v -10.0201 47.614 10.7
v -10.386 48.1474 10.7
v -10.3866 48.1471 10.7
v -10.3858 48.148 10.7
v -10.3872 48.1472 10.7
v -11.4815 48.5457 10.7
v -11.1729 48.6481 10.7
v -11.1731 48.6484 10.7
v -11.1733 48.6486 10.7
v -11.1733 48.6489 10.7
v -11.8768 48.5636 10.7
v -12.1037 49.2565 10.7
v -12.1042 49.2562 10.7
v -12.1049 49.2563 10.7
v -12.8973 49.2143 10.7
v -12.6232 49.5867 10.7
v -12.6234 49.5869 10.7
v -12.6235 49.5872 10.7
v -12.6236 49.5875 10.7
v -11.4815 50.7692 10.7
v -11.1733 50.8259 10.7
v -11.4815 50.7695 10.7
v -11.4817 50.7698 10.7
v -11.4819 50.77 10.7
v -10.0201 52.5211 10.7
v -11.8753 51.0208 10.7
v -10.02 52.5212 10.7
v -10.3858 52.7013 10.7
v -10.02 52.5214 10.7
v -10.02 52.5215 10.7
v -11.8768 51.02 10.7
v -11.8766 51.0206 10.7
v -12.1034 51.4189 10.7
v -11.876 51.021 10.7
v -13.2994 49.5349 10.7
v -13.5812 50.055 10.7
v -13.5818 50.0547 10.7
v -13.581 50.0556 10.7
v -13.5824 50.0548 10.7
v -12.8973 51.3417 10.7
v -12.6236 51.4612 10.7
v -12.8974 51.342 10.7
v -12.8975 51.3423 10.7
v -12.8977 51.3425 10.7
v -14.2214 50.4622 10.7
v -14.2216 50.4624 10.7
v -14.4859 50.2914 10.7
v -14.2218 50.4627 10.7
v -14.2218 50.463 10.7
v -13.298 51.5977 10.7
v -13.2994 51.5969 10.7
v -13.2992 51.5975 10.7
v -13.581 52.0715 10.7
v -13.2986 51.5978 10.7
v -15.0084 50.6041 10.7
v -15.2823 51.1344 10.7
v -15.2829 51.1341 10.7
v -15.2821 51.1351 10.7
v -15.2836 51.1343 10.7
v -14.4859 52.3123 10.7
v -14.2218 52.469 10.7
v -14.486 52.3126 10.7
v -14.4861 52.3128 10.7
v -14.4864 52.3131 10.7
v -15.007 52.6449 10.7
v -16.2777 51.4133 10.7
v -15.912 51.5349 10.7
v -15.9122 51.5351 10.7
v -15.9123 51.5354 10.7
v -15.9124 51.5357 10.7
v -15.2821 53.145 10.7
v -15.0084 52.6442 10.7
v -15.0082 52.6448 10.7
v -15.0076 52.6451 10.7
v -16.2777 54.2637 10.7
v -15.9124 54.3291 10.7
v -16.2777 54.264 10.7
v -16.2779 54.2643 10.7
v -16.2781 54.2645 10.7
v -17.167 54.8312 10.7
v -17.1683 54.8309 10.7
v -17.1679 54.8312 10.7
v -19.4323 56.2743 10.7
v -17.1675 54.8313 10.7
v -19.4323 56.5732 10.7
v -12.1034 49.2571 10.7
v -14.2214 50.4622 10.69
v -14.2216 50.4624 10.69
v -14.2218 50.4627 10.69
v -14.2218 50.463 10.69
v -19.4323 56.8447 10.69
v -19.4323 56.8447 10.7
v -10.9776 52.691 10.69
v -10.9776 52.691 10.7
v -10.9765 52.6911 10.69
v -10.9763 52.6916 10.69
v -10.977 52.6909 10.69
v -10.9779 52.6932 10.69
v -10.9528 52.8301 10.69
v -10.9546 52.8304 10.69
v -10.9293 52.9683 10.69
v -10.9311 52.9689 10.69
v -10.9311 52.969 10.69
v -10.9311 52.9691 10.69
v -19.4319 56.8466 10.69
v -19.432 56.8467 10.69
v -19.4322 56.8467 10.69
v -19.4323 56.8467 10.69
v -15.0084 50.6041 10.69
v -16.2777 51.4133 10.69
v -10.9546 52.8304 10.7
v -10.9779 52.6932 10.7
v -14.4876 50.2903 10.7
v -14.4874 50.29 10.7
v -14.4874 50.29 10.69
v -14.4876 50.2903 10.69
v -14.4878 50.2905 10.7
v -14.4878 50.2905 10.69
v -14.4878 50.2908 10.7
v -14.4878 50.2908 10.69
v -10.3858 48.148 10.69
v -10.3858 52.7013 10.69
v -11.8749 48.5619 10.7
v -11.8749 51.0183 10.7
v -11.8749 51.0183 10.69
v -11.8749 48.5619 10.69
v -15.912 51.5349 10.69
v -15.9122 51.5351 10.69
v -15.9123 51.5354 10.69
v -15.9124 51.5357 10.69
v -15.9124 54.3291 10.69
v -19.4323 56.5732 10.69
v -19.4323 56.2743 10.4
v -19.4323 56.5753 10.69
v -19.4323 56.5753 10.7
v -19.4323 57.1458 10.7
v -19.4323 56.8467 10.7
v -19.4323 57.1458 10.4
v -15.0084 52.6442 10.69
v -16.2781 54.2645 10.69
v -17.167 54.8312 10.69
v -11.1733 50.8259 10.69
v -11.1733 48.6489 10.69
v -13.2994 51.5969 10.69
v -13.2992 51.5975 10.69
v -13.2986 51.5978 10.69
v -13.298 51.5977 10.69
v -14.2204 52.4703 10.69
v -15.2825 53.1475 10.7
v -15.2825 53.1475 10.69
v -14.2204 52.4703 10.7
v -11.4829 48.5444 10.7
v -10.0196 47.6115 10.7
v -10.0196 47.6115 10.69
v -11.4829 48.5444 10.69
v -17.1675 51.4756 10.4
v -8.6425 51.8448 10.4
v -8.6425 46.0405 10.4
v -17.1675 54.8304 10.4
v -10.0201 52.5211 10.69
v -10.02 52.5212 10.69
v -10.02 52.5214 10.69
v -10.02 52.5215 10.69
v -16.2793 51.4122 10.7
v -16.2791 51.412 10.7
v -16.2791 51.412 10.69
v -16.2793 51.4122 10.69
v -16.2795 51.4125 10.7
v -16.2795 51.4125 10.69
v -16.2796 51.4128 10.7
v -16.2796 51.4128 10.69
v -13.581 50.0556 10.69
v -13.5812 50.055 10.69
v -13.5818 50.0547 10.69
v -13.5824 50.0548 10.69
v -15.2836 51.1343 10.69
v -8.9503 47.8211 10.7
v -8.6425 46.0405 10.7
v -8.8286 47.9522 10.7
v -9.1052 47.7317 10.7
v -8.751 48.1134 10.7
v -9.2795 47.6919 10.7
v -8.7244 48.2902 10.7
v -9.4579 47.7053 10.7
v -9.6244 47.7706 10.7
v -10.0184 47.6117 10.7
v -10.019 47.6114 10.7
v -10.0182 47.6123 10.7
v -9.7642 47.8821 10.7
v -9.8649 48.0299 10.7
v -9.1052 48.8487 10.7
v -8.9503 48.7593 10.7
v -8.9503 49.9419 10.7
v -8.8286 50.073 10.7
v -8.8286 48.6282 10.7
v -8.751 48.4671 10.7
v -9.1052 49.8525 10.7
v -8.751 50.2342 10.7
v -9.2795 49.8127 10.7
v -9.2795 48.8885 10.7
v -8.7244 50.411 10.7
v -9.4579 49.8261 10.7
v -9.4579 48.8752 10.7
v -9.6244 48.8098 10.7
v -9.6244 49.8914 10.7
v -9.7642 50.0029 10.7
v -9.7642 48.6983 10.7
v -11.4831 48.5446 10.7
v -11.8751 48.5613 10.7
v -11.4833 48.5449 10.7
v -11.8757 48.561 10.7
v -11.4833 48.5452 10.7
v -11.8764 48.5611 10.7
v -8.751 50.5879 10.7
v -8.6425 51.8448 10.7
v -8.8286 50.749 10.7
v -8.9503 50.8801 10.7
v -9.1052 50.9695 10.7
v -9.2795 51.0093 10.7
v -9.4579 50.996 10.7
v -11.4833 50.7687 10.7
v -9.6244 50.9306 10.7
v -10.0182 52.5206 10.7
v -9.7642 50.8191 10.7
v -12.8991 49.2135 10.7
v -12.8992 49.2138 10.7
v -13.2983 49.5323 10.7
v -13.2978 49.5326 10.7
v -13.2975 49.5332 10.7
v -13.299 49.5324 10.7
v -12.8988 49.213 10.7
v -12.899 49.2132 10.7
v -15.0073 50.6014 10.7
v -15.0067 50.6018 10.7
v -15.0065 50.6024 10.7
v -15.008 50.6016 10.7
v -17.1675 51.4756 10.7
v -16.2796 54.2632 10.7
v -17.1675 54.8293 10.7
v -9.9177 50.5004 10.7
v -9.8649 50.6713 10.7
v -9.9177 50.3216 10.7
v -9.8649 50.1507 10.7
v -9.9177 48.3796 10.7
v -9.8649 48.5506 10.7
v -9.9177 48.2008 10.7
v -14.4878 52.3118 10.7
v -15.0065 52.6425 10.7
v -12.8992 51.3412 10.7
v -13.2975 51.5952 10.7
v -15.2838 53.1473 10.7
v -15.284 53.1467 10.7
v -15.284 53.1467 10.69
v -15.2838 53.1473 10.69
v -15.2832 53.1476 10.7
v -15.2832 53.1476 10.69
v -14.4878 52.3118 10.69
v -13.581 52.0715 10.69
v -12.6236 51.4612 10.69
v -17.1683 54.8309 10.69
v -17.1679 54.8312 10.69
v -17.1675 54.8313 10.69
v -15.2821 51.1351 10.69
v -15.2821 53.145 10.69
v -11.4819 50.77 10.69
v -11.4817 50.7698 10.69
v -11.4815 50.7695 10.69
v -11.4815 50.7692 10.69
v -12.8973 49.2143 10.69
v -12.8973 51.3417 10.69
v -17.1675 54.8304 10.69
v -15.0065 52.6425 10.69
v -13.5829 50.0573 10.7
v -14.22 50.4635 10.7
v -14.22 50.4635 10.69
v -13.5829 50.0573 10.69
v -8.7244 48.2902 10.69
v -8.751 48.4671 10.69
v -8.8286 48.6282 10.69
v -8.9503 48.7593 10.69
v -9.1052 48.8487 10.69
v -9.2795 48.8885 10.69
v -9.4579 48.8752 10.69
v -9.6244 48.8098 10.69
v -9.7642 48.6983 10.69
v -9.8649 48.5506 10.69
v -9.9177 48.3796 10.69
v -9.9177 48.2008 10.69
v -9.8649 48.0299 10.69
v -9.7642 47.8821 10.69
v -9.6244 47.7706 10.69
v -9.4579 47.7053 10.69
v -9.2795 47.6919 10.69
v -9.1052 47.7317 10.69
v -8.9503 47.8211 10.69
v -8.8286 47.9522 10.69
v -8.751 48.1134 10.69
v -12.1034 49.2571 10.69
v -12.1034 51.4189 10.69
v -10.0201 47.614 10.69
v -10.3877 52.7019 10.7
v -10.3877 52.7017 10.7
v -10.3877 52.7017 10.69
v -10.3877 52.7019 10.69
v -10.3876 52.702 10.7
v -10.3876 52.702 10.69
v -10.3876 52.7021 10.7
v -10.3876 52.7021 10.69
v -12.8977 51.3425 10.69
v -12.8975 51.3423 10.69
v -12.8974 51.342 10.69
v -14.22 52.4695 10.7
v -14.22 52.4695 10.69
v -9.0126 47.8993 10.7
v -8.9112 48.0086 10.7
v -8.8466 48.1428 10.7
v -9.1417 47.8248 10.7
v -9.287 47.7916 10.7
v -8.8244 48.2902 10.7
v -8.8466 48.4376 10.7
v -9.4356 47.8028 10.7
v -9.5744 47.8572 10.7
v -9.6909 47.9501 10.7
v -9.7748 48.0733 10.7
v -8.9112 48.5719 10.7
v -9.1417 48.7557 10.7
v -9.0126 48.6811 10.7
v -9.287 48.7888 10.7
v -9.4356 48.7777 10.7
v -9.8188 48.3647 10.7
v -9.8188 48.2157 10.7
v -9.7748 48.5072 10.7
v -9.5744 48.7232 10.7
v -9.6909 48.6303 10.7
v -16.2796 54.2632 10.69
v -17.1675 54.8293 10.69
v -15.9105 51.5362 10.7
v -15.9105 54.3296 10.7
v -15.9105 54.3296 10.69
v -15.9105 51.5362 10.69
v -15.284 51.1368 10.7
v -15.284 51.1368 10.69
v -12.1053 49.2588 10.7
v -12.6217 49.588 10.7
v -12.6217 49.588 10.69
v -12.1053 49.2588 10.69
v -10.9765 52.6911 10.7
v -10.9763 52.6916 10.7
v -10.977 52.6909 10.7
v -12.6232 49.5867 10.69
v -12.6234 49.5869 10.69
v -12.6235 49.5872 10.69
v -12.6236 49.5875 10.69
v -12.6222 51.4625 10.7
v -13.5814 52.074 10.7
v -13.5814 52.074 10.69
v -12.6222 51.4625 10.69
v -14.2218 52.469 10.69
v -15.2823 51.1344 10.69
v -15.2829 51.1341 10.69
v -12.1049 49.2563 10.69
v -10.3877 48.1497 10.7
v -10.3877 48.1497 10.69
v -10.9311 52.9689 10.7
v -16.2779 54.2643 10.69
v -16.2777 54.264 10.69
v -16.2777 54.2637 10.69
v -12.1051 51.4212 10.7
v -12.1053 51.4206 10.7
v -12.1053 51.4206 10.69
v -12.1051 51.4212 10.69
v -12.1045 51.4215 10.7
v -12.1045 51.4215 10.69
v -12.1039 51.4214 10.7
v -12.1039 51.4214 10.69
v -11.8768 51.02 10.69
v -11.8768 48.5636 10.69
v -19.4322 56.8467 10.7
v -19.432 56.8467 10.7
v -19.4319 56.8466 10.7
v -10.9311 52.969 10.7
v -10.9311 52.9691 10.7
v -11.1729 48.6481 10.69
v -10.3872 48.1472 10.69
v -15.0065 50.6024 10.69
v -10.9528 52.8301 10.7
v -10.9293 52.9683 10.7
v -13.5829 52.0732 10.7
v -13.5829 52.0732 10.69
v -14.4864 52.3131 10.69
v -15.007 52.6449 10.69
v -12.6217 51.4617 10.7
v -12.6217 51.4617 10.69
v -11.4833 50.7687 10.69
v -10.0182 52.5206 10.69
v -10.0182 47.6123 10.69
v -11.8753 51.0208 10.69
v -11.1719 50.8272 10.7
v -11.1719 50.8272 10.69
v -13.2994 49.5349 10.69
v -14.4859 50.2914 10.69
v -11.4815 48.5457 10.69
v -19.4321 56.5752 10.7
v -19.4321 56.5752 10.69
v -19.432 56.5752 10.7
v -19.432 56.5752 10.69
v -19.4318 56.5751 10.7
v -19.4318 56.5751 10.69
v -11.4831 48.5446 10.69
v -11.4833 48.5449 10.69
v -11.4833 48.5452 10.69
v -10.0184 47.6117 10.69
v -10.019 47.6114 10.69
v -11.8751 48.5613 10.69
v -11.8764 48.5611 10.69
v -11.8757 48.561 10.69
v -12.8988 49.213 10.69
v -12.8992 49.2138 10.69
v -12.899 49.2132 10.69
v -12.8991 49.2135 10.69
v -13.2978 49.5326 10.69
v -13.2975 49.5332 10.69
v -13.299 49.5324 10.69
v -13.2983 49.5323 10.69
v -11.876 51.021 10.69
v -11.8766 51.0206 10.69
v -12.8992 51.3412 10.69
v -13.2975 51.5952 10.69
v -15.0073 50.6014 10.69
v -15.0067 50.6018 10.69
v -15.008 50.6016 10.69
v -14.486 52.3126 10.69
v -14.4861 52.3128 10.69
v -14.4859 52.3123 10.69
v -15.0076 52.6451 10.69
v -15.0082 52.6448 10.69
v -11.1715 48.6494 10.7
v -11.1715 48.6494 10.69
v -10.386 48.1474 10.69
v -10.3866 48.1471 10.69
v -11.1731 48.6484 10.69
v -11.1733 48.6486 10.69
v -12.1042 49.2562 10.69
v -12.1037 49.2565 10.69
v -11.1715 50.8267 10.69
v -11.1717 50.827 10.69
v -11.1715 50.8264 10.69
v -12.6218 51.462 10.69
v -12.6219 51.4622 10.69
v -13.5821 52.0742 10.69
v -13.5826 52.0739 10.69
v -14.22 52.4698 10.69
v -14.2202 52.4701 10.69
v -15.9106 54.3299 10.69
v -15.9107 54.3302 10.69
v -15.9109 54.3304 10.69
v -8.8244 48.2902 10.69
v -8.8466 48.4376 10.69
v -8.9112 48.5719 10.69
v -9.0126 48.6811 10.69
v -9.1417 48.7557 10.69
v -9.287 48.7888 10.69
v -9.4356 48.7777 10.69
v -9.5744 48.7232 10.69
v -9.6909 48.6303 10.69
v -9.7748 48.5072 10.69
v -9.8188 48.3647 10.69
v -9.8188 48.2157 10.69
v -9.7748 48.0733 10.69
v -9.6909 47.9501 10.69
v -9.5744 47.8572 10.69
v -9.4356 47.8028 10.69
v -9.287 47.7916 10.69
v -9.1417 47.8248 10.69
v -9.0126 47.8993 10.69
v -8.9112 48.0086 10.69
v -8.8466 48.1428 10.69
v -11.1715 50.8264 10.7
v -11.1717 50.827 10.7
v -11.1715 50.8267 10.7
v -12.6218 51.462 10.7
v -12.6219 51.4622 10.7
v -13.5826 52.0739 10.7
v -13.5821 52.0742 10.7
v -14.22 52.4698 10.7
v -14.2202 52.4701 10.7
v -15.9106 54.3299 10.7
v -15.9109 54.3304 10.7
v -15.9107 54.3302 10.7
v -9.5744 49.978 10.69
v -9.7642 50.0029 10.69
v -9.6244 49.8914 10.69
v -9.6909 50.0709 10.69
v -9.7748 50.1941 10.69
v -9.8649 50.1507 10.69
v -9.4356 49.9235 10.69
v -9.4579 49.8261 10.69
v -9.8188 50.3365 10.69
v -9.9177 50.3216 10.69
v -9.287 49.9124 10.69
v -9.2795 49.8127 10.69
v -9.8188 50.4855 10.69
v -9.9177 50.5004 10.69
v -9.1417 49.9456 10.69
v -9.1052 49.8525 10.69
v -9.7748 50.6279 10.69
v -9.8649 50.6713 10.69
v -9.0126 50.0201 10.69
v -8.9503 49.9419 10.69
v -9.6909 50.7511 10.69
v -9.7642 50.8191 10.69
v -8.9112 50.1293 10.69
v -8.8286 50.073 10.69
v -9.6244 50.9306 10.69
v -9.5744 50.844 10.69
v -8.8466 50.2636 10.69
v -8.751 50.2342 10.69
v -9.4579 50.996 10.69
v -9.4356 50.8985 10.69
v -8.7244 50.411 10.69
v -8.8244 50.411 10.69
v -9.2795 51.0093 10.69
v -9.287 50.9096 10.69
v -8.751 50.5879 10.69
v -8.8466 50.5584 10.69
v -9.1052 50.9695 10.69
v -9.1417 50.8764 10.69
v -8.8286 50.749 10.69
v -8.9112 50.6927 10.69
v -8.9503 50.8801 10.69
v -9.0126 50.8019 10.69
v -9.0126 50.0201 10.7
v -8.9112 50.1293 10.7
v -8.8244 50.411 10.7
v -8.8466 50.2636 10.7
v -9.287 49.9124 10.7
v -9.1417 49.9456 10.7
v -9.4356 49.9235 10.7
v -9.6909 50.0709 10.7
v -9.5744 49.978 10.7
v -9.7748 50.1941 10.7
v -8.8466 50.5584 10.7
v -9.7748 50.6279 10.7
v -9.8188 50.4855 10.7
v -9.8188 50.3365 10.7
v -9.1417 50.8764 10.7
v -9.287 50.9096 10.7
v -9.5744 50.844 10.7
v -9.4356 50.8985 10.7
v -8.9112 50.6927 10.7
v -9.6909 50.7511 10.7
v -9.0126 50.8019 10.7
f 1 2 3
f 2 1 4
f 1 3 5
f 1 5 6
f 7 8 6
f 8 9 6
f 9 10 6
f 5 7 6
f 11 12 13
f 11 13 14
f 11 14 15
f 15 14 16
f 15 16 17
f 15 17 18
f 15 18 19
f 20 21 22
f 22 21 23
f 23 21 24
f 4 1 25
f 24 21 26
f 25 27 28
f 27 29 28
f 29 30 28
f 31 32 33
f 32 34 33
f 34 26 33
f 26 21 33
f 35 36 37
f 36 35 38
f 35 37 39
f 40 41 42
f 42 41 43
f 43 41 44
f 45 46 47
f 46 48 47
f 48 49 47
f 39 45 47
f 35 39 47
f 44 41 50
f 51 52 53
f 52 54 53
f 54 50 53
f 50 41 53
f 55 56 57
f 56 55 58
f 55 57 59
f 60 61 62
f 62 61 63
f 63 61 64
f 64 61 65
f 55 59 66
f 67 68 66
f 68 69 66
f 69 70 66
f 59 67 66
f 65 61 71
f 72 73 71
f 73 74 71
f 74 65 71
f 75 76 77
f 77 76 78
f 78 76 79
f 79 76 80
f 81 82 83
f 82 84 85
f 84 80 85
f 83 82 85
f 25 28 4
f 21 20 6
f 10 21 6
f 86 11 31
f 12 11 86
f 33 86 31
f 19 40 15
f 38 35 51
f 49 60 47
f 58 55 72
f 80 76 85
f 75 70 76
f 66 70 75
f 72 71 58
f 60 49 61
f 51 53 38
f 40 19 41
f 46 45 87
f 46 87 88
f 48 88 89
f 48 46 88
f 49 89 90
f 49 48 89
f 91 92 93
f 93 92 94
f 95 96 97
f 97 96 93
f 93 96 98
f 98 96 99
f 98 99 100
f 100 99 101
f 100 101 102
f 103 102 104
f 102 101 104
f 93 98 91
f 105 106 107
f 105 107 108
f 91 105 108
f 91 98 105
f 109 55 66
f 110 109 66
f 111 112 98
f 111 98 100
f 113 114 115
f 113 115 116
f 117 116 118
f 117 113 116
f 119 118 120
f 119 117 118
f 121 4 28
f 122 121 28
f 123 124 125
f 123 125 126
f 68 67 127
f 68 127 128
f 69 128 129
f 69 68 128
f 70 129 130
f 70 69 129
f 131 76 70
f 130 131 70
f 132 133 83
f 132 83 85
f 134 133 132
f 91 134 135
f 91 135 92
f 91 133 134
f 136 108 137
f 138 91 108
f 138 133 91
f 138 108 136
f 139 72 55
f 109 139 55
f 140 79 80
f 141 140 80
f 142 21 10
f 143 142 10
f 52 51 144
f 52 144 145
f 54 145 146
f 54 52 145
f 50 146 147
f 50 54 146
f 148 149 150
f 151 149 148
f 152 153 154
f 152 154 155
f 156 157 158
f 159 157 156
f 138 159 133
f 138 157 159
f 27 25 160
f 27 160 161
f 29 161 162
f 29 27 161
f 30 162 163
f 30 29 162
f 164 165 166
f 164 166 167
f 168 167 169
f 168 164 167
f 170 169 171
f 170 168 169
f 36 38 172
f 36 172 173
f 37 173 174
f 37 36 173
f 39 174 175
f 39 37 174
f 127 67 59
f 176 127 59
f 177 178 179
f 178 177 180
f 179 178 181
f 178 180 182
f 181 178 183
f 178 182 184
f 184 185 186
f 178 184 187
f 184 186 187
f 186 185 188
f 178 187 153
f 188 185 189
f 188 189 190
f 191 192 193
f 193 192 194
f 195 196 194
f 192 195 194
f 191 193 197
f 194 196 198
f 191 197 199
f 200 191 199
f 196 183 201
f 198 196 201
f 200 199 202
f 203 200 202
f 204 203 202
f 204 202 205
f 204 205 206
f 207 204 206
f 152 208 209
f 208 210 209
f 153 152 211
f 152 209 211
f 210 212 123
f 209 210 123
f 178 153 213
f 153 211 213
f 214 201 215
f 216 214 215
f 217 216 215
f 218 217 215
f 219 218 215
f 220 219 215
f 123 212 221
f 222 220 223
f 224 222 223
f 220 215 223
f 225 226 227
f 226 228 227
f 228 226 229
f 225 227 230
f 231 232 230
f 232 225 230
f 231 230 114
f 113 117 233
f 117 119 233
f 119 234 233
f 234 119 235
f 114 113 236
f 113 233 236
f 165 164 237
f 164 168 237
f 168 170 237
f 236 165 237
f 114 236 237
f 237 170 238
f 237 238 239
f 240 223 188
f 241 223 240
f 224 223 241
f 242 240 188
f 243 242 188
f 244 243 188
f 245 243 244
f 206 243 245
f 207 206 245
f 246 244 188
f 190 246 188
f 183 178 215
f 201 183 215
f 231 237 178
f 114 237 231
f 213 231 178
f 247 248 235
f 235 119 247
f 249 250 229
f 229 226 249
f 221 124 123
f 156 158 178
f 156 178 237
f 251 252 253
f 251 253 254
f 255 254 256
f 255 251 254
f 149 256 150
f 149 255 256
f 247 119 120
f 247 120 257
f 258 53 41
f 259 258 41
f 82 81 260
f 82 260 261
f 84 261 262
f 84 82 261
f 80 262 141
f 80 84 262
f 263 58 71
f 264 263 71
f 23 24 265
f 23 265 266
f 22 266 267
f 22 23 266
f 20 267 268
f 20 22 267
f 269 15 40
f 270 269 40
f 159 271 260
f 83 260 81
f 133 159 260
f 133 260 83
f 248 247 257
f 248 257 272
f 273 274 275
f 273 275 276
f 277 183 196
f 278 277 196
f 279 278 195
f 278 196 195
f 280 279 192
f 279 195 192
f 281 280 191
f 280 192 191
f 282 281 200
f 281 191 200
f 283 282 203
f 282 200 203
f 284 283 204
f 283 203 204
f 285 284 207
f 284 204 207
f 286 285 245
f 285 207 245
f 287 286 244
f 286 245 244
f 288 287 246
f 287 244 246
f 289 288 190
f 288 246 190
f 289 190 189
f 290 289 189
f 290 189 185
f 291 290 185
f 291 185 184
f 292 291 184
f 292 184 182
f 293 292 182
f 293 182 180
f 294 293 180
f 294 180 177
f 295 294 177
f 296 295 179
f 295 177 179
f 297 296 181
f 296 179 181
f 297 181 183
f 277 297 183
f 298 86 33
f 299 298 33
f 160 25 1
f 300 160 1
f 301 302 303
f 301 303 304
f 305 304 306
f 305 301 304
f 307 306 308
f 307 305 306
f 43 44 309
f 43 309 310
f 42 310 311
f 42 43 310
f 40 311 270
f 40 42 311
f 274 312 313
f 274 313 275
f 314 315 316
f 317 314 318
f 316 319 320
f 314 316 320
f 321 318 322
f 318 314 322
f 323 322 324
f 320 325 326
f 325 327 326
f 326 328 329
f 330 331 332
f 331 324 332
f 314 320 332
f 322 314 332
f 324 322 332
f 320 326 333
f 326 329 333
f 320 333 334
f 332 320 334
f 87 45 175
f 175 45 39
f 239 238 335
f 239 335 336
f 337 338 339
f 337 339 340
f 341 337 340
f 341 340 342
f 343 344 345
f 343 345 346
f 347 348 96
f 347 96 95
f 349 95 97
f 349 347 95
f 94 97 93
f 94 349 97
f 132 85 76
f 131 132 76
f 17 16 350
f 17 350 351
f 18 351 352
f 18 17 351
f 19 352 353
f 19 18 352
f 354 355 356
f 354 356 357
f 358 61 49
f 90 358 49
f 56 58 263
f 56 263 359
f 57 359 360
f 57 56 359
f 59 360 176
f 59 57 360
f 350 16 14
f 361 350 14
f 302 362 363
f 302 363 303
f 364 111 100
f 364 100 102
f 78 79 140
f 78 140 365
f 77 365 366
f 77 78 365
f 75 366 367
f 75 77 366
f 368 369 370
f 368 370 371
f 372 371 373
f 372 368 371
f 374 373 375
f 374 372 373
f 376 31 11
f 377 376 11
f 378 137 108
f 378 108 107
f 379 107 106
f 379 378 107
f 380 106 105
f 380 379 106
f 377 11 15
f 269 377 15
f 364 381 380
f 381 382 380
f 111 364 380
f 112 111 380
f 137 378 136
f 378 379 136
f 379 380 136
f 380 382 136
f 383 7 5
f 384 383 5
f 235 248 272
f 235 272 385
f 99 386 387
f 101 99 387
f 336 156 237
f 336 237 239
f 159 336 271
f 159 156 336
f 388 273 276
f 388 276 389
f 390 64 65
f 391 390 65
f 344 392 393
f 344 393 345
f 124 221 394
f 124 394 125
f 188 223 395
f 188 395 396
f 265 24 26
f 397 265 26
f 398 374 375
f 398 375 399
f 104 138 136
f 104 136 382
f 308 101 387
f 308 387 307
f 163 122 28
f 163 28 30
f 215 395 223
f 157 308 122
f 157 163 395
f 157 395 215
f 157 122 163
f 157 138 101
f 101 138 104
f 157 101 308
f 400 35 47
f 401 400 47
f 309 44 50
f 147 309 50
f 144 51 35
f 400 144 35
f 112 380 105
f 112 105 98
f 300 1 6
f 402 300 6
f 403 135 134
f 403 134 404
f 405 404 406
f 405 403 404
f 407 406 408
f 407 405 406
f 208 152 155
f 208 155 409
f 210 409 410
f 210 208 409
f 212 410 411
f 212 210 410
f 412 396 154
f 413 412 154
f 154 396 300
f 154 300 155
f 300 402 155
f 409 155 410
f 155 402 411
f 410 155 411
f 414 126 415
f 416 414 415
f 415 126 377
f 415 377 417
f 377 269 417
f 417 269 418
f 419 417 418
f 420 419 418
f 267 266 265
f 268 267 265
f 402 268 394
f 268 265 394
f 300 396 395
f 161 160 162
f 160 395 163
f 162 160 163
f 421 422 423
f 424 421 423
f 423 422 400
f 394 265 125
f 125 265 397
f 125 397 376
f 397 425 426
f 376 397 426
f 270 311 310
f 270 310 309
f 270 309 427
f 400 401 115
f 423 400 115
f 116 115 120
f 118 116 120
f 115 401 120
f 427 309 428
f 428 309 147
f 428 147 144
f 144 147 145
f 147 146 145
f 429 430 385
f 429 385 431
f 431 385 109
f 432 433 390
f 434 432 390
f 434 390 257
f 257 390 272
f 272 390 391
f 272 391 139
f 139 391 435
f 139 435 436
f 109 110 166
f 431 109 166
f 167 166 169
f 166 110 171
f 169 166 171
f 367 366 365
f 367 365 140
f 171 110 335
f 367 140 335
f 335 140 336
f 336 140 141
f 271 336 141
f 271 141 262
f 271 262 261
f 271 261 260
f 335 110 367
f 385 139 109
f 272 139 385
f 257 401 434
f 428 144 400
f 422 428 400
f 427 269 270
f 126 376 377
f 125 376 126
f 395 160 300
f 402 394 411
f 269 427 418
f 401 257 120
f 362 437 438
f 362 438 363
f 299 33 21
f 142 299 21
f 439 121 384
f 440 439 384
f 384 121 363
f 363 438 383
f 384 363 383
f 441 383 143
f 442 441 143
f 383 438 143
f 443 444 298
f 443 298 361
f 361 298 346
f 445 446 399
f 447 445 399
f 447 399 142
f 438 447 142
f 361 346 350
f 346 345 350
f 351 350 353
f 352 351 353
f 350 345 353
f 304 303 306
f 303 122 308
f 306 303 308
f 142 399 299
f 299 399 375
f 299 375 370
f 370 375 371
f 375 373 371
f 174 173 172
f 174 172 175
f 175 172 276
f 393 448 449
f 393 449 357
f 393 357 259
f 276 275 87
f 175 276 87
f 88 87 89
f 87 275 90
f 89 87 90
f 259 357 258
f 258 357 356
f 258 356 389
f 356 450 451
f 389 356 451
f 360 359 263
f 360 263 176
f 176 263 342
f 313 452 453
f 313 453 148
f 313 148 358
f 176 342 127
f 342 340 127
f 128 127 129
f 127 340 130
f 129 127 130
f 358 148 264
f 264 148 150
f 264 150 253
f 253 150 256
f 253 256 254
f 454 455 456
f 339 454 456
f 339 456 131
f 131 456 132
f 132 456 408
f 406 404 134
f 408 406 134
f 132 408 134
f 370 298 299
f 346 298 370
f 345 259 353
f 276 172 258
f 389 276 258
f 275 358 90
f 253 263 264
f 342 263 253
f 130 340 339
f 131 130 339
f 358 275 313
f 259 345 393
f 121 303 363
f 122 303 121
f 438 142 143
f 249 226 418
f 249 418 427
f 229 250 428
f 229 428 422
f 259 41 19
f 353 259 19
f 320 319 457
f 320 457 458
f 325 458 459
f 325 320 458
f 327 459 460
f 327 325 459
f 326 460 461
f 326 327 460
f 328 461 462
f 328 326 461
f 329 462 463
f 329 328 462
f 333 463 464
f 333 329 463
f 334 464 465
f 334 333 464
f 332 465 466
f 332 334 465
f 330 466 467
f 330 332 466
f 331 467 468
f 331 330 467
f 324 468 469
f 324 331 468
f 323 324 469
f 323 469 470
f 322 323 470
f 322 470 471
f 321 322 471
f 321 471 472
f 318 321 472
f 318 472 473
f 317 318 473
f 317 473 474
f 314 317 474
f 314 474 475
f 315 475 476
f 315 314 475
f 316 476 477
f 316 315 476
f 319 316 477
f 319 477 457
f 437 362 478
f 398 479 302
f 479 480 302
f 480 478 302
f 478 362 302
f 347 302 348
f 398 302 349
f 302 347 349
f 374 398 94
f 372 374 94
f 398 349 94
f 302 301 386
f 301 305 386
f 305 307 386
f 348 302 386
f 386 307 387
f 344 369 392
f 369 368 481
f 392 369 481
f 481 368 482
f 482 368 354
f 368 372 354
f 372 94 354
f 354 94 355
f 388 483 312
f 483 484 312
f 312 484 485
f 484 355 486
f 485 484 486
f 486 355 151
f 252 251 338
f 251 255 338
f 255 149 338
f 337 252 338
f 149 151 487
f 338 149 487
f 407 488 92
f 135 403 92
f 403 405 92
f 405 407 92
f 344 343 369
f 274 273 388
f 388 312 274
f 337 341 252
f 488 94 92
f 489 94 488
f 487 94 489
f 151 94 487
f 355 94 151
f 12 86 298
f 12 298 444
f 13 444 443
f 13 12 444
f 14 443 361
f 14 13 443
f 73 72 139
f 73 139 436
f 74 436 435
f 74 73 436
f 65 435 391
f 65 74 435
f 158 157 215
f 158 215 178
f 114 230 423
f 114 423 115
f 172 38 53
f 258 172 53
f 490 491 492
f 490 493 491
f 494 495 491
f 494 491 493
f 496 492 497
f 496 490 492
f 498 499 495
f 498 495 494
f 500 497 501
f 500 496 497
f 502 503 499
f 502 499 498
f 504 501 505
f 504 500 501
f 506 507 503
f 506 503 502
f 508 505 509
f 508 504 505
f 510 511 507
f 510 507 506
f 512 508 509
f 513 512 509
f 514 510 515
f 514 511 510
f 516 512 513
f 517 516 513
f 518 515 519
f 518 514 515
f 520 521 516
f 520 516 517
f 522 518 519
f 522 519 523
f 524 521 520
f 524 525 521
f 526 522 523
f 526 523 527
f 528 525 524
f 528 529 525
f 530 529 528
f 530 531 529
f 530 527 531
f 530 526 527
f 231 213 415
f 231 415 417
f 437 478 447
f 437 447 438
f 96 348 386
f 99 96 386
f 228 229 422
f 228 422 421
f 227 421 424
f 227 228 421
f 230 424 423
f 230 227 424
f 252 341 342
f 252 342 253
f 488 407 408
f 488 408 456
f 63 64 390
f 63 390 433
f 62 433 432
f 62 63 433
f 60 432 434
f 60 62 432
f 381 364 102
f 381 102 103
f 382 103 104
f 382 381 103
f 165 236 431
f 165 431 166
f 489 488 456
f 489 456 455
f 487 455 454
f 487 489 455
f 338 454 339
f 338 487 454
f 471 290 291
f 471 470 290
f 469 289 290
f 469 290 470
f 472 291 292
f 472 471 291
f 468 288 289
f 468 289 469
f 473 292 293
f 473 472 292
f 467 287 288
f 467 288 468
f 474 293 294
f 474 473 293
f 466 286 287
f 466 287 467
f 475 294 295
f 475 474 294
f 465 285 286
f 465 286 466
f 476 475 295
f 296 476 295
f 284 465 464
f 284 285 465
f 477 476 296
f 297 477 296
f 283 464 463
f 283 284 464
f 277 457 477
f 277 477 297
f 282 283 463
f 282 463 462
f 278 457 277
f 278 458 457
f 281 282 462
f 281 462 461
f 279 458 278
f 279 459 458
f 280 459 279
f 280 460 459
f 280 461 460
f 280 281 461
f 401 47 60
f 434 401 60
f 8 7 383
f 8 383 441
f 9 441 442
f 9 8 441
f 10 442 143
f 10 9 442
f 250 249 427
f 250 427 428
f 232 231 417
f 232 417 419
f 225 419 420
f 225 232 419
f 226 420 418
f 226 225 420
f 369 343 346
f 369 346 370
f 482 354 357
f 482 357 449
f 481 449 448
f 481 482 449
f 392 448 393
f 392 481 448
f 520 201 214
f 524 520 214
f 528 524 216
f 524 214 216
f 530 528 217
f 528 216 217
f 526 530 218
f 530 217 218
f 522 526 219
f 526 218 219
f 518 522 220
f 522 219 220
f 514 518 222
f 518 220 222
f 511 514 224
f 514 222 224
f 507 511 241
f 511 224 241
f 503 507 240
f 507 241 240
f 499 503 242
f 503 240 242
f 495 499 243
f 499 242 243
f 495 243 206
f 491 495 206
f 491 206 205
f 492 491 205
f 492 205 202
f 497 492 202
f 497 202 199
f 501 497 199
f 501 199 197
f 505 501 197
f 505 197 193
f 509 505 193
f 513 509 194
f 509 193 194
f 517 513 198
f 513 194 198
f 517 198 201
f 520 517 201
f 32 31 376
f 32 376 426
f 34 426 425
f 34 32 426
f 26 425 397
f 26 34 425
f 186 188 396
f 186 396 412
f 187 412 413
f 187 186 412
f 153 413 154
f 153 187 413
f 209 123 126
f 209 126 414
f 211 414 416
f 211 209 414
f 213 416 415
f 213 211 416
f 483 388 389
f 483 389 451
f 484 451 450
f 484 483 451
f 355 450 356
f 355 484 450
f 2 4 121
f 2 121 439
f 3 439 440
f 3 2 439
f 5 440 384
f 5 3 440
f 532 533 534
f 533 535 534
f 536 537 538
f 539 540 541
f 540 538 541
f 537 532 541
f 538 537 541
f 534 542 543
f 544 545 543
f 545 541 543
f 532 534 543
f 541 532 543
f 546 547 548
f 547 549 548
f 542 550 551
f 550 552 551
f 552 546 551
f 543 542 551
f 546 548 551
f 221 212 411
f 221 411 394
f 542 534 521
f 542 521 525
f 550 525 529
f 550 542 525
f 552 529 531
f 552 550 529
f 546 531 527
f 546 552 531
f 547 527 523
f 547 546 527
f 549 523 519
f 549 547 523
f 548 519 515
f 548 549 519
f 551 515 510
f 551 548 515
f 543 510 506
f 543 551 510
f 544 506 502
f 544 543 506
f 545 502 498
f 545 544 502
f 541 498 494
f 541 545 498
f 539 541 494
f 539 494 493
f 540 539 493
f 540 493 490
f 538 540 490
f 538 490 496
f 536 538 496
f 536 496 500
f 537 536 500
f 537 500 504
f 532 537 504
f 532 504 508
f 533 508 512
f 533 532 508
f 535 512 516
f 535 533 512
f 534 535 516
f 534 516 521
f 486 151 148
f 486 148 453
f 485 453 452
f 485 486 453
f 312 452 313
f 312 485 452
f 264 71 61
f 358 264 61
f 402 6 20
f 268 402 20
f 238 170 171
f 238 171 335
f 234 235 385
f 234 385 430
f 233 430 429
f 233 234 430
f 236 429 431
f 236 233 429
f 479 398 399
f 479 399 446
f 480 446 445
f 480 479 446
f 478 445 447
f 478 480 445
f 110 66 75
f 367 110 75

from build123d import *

# Parameters (mm, degrees)
PAD003_DEPTH    = 0.3
POCKET010_DEPTH = 0.01
SKETCH013_R     = 0.6
SKETCH013_R_2   = 0.5
POCKET011_DEPTH = 0.01


with BuildPart() as part:
    # Sketch011 (on Face1 of Binder003) → Pad003 (new body)
    with BuildSketch(Plane.XY.offset(10.4)):
        Polygon((-19.4323216564, 57.1457720205), (-8.6424528439, 51.8447536362), (-8.6424528439, 46.0404628521), (-17.1675073393, 51.475587093), (-17.1675073393, 54.8303925061), (-19.4323216564, 56.2743184309), align=None)
    extrude(amount=PAD003_DEPTH)

    # Sketch012 (on Face8 of Pad003) → Pocket010 (cut)
    with BuildSketch(Plane.XY.offset(10.7)):
        with BuildLine():
            ThreePointArc((-17.1680102852, 54.8296036297), (-17.1682962157, 54.830895452), (-17.1670043933, 54.8311813826))
            Line((-16.2781124515, 54.2644708538), (-17.1670043933, 54.8311813826))
            ThreePointArc((-16.2781124515, 54.2644708538), (-16.2777950868, 54.2641318342), (-16.2776798331, 54.2636819774))
            Line((-16.2776798331, 51.4133038281), (-16.2776798331, 54.2636819774))
            Line((-15.0083915015, 50.6040726633), (-16.2776798331, 51.4133038281))
            Line((-15.0083915015, 52.6441603332), (-15.0083915015, 50.6040726633))
            ThreePointArc((-15.0083915015, 52.6441603332), (-15.007905794, 52.6449806438), (-15.0069529912, 52.6449492096))
            Line((-14.4863721114, 52.3130543507), (-15.0069529912, 52.6449492096))
            ThreePointArc((-14.4863721114, 52.3130543507), (-14.4860547467, 52.3127153311), (-14.4859394929, 52.3122654742))
            Line((-14.4859394929, 50.2913505742), (-14.4859394929, 52.3122654742))
            Line((-13.2994153548, 49.5348854854), (-14.4859394929, 50.2913505742))
            Line((-13.2994153548, 51.5968758055), (-13.2994153548, 49.5348854854))
            ThreePointArc((-13.2994153548, 51.5968758055), (-13.2989296473, 51.5976961161), (-13.2979768445, 51.5976646819))
            Line((-12.8977486949, 51.3425003638), (-13.2979768445, 51.5976646819))
            ThreePointArc((-12.8977486949, 51.3425003638), (-12.8974313302, 51.3421613442), (-12.8973160765, 51.3417114873))
            Line((-12.8973160765, 49.2142707243), (-12.8973160765, 51.3417114873))
            Line((-11.8767881569, 48.5636360524), (-12.8973160765, 49.2142707243))
            Line((-11.8767881569, 51.0200362699), (-11.8767881569, 48.5636360524))
            ThreePointArc((-11.8767881569, 51.0200362699), (-11.8763024494, 51.0208565805), (-11.8753496466, 51.0208251463))
            Line((-11.4818992574, 50.76998197), (-11.8753496466, 51.0208251463))
            ThreePointArc((-11.4818992574, 50.76998197), (-11.4815818927, 50.7696429504), (-11.481466639, 50.7691930936))
            Line((-11.481466639, 48.5457383169), (-11.481466639, 50.7691930936))
            Line((-10.0200536237, 47.6140186066), (-11.481466639, 48.5457383169))
            Line((-10.0200536237, 52.5211036218), (-10.0200536237, 47.6140186066))
            ThreePointArc((-10.0200536237, 52.5211036218), (-10.0191180594, 52.5220391862), (-10.018182495, 52.5211036218))
            Line((-10.018182495, 52.5211036218), (-10.018182495, 47.612312612))
            ThreePointArc((-10.018182495, 47.612312612), (-10.0186682025, 47.6114923014), (-10.0196210053, 47.6115237355))
            Line((-10.0196210053, 47.6115237355), (-11.4829051493, 48.5444363786))
            ThreePointArc((-11.4829051493, 48.5444363786), (-11.4832225139, 48.5447753982), (-11.4833377677, 48.5452252551))
            Line((-11.4833377677, 48.5452252551), (-11.4833377677, 50.7686800318))
            Line((-11.4833377677, 50.7686800318), (-11.8749170282, 51.0183302753))
            Line((-11.8749170282, 51.0183302753), (-11.8749170282, 48.5619300578))
            ThreePointArc((-11.8749170282, 48.5619300578), (-11.8754027357, 48.5611097472), (-11.8763555385, 48.5611411814))
            Line((-11.8763555385, 48.5611411814), (-12.8987545868, 49.212968786))
            ThreePointArc((-12.8987545868, 49.212968786), (-12.8990719514, 49.2133078056), (-12.8991872052, 49.2137576625))
            Line((-12.8991872052, 49.2137576625), (-12.8991872052, 51.3411984255))
            Line((-12.8991872052, 51.3411984255), (-13.2975442261, 51.5951698109))
            Line((-13.2975442261, 51.5951698109), (-13.2975442261, 49.5331794908))
            ThreePointArc((-13.2975442261, 49.5331794908), (-13.2980299336, 49.5323591802), (-13.2989827364, 49.5323906144))
            Line((-13.2989827364, 49.5323906144), (-14.4873780032, 50.290048636))
            ThreePointArc((-14.4873780032, 50.290048636), (-14.4876953679, 50.2903876556), (-14.4878106217, 50.2908375124))
            Line((-14.4878106217, 50.2908375124), (-14.4878106217, 52.3117524124))
            Line((-14.4878106217, 52.3117524124), (-15.0065203728, 52.6424543386))
            Line((-15.0065203728, 52.6424543386), (-15.0065203728, 50.6023666687))
            ThreePointArc((-15.0065203728, 50.6023666687), (-15.0070060803, 50.6015463581), (-15.0079588831, 50.6015777923))
            Line((-15.0079588831, 50.6015777923), (-16.2791183434, 51.4120018899))
            ThreePointArc((-16.2791183434, 51.4120018899), (-16.279435708, 51.4123409095), (-16.2795509618, 51.4127907663))
            Line((-16.2795509618, 51.4127907663), (-16.2795509618, 54.2631689156))
            Line((-16.2795509618, 54.2631689156), (-17.1680102852, 54.8296036297))
        make_face()
        with BuildLine():
            ThreePointArc((-12.1034421253, 49.2570922966), (-12.1039278328, 49.256271986), (-12.1048806356, 49.2563034202))
            Line((-12.6231672786, 49.586735595), (-12.1048806356, 49.2563034202))
            ThreePointArc((-12.6231672786, 49.586735595), (-12.6234846433, 49.5870746146), (-12.623599897, 49.5875244715))
            Line((-12.623599897, 51.4611507189), (-12.623599897, 49.5875244715))
            Line((-13.5809929357, 52.0715339271), (-12.623599897, 51.4611507189))
            Line((-13.5809929357, 50.0556339524), (-13.5809929357, 52.0715339271))
            ThreePointArc((-13.5809929357, 50.0556339524), (-13.5814786432, 50.0548136418), (-13.582431446, 50.054845076))
            Line((-14.2213964306, 50.4622153841), (-13.582431446, 50.054845076))
            ThreePointArc((-14.2213964306, 50.4622153841), (-14.2217137952, 50.4625544037), (-14.221829049, 50.4630042606))
            Line((-14.221829049, 52.4689756862), (-14.221829049, 50.4630042606))
            Line((-15.2821151216, 53.1449580554), (-14.221829049, 52.4689756862))
            Line((-15.2821151216, 51.1350597086), (-15.2821151216, 53.1449580554))
            ThreePointArc((-15.2821151216, 51.1350597086), (-15.2826008291, 51.134239398), (-15.2835536319, 51.1342708322))
            Line((-15.9119518491, 51.5349043279), (-15.2835536319, 51.1342708322))
            ThreePointArc((-15.9119518491, 51.5349043279), (-15.9122692138, 51.5352433475), (-15.9123844675, 51.5356932043))
            Line((-15.9123844675, 54.3290829617), (-15.9123844675, 51.5356932043))
            Line((-19.4328246024, 56.5735295545), (-15.9123844675, 54.3290829617))
            ThreePointArc((-19.4328246024, 56.5735295545), (-19.4331105329, 56.5748213769), (-19.4318187105, 56.5751073074))
            Line((-19.4318187105, 56.5751073074), (-15.9109459572, 54.3303848999))
            ThreePointArc((-15.9109459572, 54.3303848999), (-15.9106285926, 54.3300458803), (-15.9105133388, 54.3295960235))
            Line((-15.9105133388, 54.3295960235), (-15.9105133388, 51.5362062661))
            Line((-15.9105133388, 51.5362062661), (-15.2839862503, 51.1367657032))
            Line((-15.2839862503, 51.1367657032), (-15.2839862503, 53.14666405))
            ThreePointArc((-15.2839862503, 53.14666405), (-15.2835005428, 53.1474843606), (-15.28254774, 53.1474529265))
            Line((-15.28254774, 53.1474529265), (-14.2203905387, 52.4702776245))
            ThreePointArc((-14.2203905387, 52.4702776245), (-14.220073174, 52.4699386049), (-14.2199579203, 52.469488748))
            Line((-14.2199579203, 52.469488748), (-14.2199579203, 50.4635173224))
            Line((-14.2199579203, 50.4635173224), (-13.5828640644, 50.057339947))
            Line((-13.5828640644, 50.057339947), (-13.5828640644, 52.0732399217))
            ThreePointArc((-13.5828640644, 52.0732399217), (-13.5823783569, 52.0740602323), (-13.5814255541, 52.0740287981))
            Line((-13.5814255541, 52.0740287981), (-12.6221613867, 51.4624526572))
            ThreePointArc((-12.6221613867, 51.4624526572), (-12.6218440221, 51.4621136376), (-12.6217287683, 51.4616637807))
            Line((-12.6217287683, 51.4616637807), (-12.6217287683, 49.5880375333))
            Line((-12.6217287683, 49.5880375333), (-12.105313254, 49.2587982912))
            Line((-12.105313254, 49.2587982912), (-12.105313254, 51.4206091267))
            ThreePointArc((-12.105313254, 51.4206091267), (-12.1048275465, 51.4214294373), (-12.1038747437, 51.4213980031))
            Line((-12.1038747437, 51.4213980031), (-11.1719060657, 50.8272240238))
            ThreePointArc((-11.1719060657, 50.8272240238), (-11.171588701, 50.8268850042), (-11.1714734473, 50.8264351473))
            Line((-11.1714734473, 50.8264351473), (-11.1714734473, 48.649445714))
            Line((-11.1714734473, 48.649445714), (-10.387665926, 48.1497314586))
            Line((-10.387665926, 48.1497314586), (-10.387665926, 52.7017100413))
            ThreePointArc((-10.387665926, 52.7017100413), (-10.3867303616, 52.7026456056), (-10.3857947972, 52.7017100413))
            Line((-10.3857947972, 48.148025464), (-10.3857947972, 52.7017100413))
            ThreePointArc((-10.3857947972, 48.148025464), (-10.3862805047, 48.1472051534), (-10.3872333075, 48.1472365875))
            Line((-11.1729119576, 48.6481437757), (-10.3872333075, 48.1472365875))
            ThreePointArc((-11.1729119576, 48.6481437757), (-11.1732293222, 48.6484827953), (-11.173344576, 48.6489326522))
            Line((-11.173344576, 50.8259220855), (-11.173344576, 48.6489326522))
            Line((-12.1034421253, 51.4189031321), (-11.173344576, 50.8259220855))
            Line((-12.1034421253, 49.2570922966), (-12.1034421253, 51.4189031321))
        make_face()
        with BuildLine():
            ThreePointArc((-10.9311455672, 52.9688822106), (-10.9300667853, 52.9696482334), (-10.9293007625, 52.9685694515))
            Line((-10.9527757478, 52.8301026156), (-10.9293007625, 52.9685694515))
            Line((-10.976250733, 52.6916357798), (-10.9527757478, 52.8301026156))
            ThreePointArc((-10.976250733, 52.6916357798), (-10.9767468482, 52.6909593569), (-10.9775856752, 52.690952462))
            Line((-19.4327341963, 56.8449323232), (-10.9775856752, 52.690952462))
            ThreePointArc((-19.4327341963, 56.8449323232), (-19.4331613537, 56.8461845604), (-19.4319091166, 56.8466117178))
            Line((-19.4319091166, 56.8466117178), (-10.9778859578, 52.6931847425))
            Line((-10.9778859578, 52.6931847425), (-10.9546205525, 52.8304153747))
            Line((-10.9546205525, 52.8304153747), (-10.9311455672, 52.9688822106))
        make_face()
    extrude(amount=-POCKET010_DEPTH, mode=Mode.SUBTRACT)

    # Sketch013 (on Face4 of Pocket010) → Pocket011 (cut)
    with BuildSketch(Plane.XY.offset(10.7)):
        with Locations((-9.324359, 50.411007)):
            Circle(SKETCH013_R)
        with Locations((-9.324359, 50.411007)):
            Circle(SKETCH013_R_2, mode=Mode.SUBTRACT)
        with Locations((-9.324359, 48.290222)):
            Circle(SKETCH013_R)
        with Locations((-9.324359, 48.290222)):
            Circle(SKETCH013_R_2, mode=Mode.SUBTRACT)
    extrude(amount=-POCKET011_DEPTH, mode=Mode.SUBTRACT)


solid = part.part
